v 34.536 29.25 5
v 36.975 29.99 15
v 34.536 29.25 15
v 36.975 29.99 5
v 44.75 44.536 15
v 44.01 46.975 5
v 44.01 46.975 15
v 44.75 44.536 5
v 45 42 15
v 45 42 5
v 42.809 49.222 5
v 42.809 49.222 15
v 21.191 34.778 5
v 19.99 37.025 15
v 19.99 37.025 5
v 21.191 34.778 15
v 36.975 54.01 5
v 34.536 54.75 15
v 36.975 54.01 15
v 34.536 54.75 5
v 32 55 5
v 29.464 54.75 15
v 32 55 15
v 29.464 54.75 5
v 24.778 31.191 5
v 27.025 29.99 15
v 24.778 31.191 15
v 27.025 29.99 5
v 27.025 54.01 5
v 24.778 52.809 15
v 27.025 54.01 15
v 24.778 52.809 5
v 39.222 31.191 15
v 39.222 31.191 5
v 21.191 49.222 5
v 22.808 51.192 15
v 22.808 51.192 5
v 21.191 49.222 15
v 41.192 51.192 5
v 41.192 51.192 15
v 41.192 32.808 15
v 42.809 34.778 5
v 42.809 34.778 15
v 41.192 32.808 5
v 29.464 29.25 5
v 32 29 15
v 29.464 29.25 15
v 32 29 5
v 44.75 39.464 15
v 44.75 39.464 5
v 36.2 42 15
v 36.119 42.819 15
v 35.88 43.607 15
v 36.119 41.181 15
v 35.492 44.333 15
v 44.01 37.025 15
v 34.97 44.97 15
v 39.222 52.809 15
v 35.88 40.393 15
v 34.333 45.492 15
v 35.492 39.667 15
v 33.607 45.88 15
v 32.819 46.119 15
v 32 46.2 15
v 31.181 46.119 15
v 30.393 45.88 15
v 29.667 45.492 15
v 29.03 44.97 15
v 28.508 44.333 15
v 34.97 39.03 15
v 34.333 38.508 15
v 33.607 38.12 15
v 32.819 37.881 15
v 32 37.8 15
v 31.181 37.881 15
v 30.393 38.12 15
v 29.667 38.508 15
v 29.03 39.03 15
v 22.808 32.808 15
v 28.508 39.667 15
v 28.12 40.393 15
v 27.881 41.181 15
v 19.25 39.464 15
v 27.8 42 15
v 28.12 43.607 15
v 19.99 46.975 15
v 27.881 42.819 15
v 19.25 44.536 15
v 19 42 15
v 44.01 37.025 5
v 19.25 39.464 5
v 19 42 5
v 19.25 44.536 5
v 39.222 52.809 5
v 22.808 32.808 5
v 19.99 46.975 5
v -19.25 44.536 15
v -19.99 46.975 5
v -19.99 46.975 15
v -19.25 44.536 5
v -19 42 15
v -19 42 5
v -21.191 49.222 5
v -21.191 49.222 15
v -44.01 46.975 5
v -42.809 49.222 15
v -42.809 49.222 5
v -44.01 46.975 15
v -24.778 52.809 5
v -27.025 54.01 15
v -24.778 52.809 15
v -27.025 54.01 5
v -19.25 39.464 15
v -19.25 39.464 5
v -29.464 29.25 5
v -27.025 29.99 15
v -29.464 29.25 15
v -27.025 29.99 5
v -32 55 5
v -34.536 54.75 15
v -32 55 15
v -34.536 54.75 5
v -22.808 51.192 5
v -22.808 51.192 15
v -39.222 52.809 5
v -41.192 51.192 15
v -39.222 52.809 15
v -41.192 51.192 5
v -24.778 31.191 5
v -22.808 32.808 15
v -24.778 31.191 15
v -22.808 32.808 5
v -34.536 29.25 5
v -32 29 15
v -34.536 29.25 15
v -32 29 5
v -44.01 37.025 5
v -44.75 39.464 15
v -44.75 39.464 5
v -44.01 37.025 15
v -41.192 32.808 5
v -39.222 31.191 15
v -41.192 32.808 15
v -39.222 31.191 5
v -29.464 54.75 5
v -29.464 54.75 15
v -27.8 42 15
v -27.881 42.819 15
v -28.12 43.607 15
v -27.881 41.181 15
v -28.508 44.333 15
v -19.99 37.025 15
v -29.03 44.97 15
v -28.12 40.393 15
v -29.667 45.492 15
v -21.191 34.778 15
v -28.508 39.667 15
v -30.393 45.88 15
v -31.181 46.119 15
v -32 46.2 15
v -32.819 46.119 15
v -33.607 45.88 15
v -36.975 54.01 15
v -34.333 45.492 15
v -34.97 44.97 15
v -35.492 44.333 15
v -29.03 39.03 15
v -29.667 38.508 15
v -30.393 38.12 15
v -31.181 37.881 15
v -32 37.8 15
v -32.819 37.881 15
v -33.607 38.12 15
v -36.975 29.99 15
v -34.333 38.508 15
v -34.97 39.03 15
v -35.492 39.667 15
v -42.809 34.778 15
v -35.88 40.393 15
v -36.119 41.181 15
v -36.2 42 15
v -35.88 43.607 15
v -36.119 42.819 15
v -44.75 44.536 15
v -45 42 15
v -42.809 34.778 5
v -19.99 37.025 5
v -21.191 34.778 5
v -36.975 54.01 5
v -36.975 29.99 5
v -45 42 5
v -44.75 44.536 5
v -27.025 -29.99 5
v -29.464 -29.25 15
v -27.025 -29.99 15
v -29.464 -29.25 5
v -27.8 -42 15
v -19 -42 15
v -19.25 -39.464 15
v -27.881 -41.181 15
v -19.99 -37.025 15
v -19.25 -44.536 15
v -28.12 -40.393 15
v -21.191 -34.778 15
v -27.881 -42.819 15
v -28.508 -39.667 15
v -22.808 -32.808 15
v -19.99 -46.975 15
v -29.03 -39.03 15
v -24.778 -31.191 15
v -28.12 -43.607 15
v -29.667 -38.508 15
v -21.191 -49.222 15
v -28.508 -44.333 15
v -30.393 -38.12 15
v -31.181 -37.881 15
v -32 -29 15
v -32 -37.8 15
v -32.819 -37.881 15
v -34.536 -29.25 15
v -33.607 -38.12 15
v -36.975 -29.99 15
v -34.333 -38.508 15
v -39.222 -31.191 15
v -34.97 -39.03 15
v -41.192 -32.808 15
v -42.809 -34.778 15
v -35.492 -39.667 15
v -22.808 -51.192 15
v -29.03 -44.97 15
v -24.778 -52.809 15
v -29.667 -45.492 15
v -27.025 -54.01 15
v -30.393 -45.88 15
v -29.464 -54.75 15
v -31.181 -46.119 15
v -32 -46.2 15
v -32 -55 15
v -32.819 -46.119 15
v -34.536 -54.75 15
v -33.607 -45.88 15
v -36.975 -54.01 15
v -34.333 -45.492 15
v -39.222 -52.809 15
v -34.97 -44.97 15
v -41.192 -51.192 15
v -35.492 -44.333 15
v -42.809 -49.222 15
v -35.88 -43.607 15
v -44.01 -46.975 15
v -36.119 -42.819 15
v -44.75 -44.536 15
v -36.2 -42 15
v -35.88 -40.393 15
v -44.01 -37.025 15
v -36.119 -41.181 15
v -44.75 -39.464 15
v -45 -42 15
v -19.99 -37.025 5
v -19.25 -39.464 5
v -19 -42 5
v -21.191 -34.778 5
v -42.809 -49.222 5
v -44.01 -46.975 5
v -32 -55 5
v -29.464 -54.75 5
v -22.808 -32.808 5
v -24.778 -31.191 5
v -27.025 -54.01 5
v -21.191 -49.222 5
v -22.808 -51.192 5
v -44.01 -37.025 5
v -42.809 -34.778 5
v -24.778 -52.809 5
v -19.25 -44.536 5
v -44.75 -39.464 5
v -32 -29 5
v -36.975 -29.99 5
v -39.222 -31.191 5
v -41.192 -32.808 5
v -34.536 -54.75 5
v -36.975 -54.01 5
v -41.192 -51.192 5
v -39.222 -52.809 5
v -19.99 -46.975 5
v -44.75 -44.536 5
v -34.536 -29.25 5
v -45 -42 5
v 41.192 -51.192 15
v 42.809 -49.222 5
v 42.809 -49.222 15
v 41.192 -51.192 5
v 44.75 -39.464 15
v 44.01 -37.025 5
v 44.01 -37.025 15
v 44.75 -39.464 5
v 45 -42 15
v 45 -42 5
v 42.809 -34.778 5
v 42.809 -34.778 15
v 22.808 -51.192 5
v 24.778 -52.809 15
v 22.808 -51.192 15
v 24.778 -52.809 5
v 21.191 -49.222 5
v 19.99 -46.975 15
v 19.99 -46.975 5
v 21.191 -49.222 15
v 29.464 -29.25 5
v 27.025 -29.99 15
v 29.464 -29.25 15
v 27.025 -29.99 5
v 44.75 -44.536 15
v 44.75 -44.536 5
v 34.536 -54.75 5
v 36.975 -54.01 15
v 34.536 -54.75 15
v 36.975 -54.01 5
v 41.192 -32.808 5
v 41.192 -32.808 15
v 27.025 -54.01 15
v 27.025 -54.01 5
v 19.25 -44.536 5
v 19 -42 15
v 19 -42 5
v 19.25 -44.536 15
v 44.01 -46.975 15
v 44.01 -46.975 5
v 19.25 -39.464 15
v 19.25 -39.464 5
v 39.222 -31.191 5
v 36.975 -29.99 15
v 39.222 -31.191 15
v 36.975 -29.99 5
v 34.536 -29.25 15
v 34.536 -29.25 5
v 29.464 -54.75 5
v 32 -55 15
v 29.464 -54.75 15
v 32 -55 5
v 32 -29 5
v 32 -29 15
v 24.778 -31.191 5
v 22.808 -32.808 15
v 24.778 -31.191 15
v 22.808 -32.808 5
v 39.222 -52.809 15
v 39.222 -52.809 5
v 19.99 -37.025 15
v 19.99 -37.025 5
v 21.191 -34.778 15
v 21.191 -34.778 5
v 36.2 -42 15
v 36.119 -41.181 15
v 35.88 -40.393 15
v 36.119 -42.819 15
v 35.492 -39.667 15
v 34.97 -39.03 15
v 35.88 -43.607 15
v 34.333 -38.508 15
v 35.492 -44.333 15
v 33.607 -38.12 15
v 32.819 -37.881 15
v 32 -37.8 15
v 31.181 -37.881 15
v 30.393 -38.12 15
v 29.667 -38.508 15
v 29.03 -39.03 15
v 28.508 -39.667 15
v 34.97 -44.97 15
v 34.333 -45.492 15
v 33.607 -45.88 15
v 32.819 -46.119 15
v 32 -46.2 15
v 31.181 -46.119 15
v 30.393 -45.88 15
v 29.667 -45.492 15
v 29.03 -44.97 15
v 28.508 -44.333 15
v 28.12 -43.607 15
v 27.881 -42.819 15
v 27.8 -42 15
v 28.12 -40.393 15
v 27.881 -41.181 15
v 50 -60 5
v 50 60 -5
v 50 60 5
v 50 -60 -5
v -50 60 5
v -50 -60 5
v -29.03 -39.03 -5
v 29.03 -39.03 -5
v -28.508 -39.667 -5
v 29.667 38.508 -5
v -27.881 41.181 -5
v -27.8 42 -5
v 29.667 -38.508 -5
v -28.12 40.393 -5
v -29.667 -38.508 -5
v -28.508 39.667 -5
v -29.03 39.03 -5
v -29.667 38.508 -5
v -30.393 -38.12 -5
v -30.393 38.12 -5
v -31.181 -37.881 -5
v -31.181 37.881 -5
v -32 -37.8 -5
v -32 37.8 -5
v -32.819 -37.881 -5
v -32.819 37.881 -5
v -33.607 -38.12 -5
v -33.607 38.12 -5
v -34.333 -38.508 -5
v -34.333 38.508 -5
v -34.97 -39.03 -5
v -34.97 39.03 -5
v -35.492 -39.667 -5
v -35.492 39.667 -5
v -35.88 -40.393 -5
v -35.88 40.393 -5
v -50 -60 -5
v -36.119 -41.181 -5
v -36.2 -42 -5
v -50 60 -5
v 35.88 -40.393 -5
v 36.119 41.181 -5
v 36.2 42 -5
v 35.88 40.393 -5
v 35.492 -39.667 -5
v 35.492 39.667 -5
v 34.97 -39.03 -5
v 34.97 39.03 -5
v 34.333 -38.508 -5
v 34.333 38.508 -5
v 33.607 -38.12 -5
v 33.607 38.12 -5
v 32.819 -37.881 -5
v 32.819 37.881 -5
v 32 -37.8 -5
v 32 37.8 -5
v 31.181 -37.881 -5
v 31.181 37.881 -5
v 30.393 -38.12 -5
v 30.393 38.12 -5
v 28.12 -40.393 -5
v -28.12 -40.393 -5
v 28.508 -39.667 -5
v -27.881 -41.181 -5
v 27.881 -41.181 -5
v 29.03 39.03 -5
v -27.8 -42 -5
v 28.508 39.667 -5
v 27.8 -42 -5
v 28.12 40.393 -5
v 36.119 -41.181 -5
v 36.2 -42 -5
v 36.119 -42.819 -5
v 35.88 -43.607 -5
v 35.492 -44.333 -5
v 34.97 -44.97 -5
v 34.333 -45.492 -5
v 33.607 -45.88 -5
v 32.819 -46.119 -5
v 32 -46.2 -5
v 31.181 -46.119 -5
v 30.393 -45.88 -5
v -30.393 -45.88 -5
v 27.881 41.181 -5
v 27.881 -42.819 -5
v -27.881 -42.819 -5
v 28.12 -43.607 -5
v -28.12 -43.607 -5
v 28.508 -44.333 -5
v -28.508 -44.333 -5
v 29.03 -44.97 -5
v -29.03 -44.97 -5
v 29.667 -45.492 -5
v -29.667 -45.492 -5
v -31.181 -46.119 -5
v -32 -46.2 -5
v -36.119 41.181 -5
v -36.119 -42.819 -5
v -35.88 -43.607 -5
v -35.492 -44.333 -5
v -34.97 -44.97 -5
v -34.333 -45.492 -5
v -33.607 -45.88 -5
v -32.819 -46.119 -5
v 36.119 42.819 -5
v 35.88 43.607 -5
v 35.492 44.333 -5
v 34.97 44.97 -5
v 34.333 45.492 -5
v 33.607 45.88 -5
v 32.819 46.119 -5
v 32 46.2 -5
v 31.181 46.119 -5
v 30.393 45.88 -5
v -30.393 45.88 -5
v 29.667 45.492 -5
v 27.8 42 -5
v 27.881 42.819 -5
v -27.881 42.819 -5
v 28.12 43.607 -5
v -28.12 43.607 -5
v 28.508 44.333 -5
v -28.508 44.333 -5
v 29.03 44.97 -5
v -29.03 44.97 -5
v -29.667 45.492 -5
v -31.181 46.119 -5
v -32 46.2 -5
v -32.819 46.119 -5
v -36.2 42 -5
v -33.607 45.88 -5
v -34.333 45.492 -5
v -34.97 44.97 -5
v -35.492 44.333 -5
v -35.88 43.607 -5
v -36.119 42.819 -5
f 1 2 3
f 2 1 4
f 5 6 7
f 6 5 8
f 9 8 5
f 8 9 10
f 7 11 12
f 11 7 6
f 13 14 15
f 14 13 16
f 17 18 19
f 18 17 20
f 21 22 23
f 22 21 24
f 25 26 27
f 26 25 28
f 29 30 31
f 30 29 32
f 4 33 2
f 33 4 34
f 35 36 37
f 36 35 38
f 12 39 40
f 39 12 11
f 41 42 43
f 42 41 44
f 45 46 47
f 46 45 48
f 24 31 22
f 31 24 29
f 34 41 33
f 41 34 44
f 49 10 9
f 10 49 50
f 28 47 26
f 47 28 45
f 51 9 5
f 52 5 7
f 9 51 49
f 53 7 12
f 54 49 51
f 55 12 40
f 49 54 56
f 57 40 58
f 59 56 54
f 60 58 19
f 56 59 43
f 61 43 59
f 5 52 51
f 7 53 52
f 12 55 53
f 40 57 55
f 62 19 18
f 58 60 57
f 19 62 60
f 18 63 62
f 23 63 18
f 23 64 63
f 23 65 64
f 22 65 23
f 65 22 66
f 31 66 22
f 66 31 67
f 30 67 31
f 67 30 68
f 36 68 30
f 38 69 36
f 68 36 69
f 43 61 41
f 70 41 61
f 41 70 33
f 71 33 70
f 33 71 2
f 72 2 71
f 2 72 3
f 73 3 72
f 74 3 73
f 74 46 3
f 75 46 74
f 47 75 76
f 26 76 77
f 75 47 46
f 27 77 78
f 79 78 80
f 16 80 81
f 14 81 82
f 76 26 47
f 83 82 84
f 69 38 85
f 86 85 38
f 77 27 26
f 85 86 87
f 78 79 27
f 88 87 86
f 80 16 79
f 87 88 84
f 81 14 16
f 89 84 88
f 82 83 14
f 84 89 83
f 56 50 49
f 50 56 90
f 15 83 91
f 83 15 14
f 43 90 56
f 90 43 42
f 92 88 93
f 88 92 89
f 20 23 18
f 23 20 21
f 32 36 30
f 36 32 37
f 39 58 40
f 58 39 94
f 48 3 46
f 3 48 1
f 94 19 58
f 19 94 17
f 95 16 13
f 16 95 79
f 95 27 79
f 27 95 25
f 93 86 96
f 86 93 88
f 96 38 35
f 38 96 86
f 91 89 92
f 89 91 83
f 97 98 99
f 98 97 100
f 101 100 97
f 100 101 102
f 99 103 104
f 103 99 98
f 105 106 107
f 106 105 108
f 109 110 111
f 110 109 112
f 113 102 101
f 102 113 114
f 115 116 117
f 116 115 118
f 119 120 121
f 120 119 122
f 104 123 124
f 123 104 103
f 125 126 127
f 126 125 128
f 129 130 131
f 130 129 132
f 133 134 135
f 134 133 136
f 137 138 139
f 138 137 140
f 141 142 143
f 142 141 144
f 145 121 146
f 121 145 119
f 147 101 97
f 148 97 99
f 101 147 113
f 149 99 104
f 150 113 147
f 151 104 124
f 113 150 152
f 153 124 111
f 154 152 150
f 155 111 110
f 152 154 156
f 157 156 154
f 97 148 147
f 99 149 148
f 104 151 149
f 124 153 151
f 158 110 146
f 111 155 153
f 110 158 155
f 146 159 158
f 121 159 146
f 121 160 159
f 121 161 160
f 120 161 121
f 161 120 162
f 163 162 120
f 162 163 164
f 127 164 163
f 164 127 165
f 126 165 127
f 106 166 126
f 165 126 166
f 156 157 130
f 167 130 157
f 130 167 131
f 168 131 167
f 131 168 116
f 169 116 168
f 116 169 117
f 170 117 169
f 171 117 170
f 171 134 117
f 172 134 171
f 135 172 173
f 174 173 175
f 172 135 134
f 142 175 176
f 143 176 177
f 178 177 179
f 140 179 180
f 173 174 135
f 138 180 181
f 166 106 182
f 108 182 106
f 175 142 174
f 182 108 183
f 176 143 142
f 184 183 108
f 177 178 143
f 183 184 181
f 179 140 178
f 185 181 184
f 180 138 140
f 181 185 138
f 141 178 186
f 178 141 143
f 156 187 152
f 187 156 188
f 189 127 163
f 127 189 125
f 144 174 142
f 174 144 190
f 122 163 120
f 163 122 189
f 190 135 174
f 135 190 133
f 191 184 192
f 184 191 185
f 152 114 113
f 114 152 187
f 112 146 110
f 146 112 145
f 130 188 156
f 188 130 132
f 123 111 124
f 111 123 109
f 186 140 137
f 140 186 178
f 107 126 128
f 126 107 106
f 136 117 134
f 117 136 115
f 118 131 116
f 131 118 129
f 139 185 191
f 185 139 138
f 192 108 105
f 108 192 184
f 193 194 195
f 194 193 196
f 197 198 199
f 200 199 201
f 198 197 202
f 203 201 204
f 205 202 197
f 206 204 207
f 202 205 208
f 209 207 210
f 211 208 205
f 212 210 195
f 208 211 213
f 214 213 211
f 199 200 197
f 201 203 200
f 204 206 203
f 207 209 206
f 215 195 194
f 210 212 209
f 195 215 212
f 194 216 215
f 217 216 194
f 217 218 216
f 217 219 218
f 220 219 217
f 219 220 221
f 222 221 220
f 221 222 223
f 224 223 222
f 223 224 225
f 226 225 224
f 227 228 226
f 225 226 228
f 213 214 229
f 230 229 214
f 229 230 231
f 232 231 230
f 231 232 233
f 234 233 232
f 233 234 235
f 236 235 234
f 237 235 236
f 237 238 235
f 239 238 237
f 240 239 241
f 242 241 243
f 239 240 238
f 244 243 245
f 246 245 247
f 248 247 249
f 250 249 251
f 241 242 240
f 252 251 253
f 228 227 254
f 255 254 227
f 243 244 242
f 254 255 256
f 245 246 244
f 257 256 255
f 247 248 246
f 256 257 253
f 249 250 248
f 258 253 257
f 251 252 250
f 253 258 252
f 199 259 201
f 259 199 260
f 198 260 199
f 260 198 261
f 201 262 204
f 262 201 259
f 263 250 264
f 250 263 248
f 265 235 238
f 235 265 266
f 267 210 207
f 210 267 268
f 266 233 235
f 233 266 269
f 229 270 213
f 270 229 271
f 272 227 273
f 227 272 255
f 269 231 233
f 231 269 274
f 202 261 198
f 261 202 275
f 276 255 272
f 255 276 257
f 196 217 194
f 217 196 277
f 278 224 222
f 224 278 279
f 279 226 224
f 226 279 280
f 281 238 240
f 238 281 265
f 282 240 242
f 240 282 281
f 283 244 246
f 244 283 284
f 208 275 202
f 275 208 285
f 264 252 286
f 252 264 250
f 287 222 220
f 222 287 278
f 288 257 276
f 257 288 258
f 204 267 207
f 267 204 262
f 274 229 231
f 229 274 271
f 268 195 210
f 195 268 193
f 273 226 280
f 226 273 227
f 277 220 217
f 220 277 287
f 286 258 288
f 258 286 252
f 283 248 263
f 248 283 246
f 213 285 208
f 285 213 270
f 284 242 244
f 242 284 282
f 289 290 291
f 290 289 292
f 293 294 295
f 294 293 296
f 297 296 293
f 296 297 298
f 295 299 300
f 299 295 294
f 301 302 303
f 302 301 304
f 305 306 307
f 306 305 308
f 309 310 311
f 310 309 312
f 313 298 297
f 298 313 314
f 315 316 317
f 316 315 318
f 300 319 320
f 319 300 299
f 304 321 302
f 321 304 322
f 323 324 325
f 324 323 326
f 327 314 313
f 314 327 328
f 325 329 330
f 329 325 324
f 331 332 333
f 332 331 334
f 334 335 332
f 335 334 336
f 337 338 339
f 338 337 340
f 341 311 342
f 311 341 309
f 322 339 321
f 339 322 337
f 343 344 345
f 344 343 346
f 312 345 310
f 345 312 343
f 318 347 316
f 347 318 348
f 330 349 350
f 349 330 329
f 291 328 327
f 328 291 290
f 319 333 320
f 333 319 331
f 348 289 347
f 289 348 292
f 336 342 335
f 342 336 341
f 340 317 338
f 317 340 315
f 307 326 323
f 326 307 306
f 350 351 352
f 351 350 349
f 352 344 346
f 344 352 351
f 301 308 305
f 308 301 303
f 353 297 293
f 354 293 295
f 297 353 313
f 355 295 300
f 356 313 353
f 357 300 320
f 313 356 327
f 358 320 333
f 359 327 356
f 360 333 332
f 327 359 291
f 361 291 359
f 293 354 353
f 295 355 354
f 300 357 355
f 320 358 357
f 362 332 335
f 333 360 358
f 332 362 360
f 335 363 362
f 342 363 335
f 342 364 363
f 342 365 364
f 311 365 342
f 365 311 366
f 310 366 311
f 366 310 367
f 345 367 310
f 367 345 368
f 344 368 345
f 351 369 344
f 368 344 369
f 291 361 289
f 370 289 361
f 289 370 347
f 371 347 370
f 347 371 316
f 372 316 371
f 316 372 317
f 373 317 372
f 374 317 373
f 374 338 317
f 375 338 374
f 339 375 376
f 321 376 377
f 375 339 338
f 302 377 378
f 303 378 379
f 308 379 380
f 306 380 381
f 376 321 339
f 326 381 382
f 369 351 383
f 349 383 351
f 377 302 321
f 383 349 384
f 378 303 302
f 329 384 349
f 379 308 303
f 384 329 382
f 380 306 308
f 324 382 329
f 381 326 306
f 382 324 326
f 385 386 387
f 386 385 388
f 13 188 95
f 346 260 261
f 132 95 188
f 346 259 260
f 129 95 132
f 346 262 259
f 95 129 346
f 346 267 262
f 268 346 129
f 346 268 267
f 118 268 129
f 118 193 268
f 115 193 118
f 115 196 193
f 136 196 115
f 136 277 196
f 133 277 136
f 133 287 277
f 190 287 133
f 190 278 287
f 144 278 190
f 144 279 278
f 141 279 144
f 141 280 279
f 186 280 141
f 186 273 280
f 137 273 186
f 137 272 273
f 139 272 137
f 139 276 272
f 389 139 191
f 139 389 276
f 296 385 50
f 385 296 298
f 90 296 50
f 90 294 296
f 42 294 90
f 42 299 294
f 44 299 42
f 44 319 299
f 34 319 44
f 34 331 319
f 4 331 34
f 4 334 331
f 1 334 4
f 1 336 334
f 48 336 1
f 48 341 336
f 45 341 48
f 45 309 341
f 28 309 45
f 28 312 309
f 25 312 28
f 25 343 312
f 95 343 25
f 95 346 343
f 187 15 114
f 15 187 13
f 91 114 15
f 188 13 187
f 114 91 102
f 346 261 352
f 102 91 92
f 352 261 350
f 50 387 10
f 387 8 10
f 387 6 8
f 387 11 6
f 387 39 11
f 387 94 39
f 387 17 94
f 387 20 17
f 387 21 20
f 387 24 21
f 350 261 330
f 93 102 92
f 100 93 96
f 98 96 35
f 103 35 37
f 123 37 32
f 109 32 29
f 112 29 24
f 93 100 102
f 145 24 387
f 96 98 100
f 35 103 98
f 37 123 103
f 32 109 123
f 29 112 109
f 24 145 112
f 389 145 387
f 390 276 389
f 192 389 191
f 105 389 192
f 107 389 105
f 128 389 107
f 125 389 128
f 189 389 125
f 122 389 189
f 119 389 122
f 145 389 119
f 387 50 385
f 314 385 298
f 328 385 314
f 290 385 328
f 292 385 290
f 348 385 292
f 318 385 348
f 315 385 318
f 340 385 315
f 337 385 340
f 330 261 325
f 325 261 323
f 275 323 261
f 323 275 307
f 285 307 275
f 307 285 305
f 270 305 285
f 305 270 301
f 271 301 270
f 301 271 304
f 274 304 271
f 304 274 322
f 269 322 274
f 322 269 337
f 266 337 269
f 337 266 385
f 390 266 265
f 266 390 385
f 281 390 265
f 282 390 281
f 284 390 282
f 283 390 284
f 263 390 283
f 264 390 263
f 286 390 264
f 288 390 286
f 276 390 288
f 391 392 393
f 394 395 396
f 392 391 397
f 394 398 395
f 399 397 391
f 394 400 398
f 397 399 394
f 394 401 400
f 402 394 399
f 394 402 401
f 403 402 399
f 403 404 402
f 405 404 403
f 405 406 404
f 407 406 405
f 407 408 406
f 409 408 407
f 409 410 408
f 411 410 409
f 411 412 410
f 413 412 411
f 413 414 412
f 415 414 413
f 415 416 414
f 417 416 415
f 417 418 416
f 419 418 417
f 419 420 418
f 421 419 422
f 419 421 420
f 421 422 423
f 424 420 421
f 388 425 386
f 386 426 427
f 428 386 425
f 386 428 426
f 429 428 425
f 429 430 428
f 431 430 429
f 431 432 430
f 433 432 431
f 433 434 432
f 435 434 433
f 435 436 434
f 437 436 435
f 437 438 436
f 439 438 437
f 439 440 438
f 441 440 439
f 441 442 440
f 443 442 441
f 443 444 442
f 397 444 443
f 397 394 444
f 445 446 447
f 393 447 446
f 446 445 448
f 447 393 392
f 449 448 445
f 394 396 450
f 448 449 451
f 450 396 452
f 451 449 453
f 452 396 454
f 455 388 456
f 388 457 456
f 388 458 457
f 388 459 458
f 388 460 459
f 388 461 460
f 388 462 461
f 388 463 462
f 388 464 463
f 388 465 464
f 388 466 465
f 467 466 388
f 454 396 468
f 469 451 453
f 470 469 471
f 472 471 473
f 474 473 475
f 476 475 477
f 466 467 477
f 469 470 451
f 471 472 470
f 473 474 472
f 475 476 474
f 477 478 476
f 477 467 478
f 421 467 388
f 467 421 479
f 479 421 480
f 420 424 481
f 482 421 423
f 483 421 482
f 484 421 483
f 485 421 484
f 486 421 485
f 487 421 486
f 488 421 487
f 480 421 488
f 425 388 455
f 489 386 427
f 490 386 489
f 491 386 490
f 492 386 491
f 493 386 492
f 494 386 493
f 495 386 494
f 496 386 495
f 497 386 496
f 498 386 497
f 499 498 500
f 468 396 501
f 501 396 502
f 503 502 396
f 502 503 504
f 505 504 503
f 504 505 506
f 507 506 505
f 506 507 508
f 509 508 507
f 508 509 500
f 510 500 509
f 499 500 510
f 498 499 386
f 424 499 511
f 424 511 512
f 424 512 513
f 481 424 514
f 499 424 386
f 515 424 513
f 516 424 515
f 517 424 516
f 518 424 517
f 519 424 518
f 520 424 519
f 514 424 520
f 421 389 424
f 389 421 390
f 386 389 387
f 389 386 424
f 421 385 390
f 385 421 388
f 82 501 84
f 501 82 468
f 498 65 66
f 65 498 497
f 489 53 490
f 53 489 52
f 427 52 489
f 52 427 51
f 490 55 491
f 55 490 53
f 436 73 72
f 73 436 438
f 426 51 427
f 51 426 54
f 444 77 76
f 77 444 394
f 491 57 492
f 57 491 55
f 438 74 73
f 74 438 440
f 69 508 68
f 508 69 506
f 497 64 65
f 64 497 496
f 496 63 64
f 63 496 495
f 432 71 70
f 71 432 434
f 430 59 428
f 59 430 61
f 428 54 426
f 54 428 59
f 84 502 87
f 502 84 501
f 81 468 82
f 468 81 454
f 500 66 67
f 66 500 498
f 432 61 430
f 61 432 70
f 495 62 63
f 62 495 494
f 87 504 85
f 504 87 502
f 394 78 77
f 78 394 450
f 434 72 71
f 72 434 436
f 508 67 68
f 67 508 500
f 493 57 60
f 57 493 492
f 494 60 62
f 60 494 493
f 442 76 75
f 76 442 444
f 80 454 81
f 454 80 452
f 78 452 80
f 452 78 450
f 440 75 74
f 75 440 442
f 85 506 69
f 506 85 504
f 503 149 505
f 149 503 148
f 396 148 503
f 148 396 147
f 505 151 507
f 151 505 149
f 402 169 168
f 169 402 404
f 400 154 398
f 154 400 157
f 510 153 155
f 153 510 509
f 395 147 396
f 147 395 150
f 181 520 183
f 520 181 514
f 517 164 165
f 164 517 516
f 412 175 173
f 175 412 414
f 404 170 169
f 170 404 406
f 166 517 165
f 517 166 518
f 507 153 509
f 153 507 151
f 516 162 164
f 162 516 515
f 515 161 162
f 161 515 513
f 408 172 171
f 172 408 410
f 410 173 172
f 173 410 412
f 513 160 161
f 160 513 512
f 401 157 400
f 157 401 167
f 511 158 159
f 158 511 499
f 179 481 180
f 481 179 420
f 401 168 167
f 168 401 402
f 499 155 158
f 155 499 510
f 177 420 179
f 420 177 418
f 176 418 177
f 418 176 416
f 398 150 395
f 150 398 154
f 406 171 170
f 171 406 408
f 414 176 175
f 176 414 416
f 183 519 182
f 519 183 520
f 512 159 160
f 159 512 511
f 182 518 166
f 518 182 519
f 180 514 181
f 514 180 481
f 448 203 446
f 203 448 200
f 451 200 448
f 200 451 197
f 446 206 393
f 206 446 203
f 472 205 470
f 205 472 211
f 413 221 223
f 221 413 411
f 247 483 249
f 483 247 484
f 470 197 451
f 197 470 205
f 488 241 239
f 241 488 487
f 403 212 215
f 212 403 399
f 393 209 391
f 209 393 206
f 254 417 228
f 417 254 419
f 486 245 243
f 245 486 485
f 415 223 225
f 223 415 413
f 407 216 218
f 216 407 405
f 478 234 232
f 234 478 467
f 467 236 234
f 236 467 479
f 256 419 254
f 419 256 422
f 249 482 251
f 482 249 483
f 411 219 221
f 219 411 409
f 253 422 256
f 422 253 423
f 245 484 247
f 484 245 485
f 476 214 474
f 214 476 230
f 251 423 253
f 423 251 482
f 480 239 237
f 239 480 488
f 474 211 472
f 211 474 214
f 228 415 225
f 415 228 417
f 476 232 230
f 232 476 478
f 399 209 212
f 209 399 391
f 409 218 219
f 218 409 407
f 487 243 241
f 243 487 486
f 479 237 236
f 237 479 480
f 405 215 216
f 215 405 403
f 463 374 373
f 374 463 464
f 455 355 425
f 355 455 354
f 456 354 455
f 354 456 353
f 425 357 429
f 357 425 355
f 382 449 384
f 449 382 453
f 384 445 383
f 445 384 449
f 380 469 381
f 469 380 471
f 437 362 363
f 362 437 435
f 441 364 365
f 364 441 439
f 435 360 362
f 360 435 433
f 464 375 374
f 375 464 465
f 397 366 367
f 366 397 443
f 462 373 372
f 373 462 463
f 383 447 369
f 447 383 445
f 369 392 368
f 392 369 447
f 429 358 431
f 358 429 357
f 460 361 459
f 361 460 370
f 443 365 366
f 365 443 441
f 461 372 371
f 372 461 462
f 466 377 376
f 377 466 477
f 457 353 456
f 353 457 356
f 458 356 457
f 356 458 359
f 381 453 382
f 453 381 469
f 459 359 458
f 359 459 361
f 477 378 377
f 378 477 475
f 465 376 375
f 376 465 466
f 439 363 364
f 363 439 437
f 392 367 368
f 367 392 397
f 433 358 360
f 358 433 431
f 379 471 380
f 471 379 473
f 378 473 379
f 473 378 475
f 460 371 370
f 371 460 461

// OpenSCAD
$fn = 32;

// ----------------------------------------------------------------------
// Anchor pads 100 x 120 x 20
// four corner bosses with anchor holes
// ----------------------------------------------------------------------

// --- parameters (mm) ---
plate = [100, 120, 10];  // base plate size (x, y, z)
pads = 4;                // boss count, one per corner
edge = 18;               // boss centre offset from the plate edge
boss_d = 26;             // boss diameter
boss_h = 10;             // boss height above the base plate
hole_d = 8.4;            // hole diameter

// --- derived feature positions (mm) ---
height = plate[2] + boss_h;      // = 20   overall height of the part
corner_x = plate[0] / 2 - edge;  // = 32   boss centre X
corner_y = plate[1] / 2 - edge;  // = 42   boss centre Y
feature_centers = [
  [corner_x, corner_y],
  [-corner_x, corner_y],
  [-corner_x, -corner_y],
  [corner_x, -corner_y]
];   // boss centres, anchor holes are drilled there

// base plate, four bosses standing on it, anchor holes all the way through
difference() {
  union() {
    cube(plate, center = true);
    for (centre = feature_centers)
      translate([centre[0], centre[1], plate[2] / 2 - 1])
        cylinder(d = boss_d, h = boss_h + 1);
  }
  for (centre = feature_centers)
    translate([centre[0], centre[1], -height])
      cylinder(d = hole_d, h = 2 * height + 2);  // through boss and plate
}
